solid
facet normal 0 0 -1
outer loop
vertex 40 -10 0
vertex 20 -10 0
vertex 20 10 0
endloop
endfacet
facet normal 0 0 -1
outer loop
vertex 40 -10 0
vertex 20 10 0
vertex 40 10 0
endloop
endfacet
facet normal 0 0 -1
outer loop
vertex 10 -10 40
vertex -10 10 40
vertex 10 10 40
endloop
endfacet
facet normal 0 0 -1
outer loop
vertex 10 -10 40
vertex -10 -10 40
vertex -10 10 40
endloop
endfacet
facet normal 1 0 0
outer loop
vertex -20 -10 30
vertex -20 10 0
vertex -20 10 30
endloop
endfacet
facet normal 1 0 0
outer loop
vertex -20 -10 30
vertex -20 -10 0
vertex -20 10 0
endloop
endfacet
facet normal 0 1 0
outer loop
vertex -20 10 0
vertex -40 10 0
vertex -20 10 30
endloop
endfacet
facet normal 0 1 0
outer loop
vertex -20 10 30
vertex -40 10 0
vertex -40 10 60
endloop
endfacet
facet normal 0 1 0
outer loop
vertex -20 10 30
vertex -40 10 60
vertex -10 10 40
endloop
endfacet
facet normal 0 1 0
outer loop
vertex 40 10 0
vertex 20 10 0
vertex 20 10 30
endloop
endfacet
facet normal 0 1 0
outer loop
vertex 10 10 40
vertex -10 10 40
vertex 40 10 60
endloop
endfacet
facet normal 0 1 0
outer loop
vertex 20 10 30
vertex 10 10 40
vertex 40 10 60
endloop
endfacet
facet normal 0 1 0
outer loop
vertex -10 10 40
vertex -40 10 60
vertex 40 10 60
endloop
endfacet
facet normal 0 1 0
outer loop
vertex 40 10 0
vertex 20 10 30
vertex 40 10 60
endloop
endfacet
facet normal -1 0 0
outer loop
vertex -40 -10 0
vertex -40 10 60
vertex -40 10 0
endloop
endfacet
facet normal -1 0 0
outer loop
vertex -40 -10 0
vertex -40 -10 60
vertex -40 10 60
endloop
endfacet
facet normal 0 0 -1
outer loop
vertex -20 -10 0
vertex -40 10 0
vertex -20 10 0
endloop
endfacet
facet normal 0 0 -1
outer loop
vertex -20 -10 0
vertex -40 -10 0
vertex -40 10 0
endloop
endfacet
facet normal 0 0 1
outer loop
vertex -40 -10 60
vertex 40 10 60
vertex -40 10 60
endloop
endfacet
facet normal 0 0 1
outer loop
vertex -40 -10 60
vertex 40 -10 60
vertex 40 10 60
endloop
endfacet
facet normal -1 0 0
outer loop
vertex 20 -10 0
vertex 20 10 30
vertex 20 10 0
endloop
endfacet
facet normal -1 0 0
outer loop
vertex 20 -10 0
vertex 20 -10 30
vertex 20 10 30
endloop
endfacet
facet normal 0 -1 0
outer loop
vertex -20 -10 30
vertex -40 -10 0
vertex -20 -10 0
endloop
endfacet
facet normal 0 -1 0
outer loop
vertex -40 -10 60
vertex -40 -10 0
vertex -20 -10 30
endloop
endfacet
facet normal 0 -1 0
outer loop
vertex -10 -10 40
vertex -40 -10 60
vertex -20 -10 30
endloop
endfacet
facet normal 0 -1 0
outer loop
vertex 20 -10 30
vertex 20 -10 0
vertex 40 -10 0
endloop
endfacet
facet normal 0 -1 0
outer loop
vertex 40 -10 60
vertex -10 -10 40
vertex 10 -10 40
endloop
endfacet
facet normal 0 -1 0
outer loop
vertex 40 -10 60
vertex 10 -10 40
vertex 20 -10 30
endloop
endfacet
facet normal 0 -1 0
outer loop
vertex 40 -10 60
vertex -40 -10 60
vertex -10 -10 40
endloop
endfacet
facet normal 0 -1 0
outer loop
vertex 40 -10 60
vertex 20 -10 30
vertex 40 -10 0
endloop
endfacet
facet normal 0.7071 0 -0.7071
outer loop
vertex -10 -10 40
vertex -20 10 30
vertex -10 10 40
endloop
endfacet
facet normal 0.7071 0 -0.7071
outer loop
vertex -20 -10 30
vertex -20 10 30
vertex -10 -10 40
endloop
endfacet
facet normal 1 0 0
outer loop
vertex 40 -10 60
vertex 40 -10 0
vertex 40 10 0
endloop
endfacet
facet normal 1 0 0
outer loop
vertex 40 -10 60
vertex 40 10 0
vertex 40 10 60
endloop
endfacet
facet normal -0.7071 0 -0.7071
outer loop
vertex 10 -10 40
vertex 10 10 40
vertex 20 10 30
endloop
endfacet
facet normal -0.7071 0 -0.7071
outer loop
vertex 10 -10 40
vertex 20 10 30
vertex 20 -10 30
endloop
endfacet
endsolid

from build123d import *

# Parameters (mm, degrees)
PAD_DEPTH    = 10
CHAMFER_SIZE = 10


with BuildPart() as part:
    # Sketch → Pad (new body, symmetric)
    with BuildSketch(Plane.XZ):
        Polygon((-40, 0), (-20, 0), (-20, 40), (20, 40), (20, 0), (40, 0), (40, 60), (-40, 60), align=None)
    extrude(amount=PAD_DEPTH, both=True)

    # Chamfer
    chamfer_edges = [part.edges().sort_by_distance(p)[0] for p in [
        (-20, 0, 40),
        (20, 0, 40),
    ]]
    chamfer(chamfer_edges, length=CHAMFER_SIZE)


solid = part.part
